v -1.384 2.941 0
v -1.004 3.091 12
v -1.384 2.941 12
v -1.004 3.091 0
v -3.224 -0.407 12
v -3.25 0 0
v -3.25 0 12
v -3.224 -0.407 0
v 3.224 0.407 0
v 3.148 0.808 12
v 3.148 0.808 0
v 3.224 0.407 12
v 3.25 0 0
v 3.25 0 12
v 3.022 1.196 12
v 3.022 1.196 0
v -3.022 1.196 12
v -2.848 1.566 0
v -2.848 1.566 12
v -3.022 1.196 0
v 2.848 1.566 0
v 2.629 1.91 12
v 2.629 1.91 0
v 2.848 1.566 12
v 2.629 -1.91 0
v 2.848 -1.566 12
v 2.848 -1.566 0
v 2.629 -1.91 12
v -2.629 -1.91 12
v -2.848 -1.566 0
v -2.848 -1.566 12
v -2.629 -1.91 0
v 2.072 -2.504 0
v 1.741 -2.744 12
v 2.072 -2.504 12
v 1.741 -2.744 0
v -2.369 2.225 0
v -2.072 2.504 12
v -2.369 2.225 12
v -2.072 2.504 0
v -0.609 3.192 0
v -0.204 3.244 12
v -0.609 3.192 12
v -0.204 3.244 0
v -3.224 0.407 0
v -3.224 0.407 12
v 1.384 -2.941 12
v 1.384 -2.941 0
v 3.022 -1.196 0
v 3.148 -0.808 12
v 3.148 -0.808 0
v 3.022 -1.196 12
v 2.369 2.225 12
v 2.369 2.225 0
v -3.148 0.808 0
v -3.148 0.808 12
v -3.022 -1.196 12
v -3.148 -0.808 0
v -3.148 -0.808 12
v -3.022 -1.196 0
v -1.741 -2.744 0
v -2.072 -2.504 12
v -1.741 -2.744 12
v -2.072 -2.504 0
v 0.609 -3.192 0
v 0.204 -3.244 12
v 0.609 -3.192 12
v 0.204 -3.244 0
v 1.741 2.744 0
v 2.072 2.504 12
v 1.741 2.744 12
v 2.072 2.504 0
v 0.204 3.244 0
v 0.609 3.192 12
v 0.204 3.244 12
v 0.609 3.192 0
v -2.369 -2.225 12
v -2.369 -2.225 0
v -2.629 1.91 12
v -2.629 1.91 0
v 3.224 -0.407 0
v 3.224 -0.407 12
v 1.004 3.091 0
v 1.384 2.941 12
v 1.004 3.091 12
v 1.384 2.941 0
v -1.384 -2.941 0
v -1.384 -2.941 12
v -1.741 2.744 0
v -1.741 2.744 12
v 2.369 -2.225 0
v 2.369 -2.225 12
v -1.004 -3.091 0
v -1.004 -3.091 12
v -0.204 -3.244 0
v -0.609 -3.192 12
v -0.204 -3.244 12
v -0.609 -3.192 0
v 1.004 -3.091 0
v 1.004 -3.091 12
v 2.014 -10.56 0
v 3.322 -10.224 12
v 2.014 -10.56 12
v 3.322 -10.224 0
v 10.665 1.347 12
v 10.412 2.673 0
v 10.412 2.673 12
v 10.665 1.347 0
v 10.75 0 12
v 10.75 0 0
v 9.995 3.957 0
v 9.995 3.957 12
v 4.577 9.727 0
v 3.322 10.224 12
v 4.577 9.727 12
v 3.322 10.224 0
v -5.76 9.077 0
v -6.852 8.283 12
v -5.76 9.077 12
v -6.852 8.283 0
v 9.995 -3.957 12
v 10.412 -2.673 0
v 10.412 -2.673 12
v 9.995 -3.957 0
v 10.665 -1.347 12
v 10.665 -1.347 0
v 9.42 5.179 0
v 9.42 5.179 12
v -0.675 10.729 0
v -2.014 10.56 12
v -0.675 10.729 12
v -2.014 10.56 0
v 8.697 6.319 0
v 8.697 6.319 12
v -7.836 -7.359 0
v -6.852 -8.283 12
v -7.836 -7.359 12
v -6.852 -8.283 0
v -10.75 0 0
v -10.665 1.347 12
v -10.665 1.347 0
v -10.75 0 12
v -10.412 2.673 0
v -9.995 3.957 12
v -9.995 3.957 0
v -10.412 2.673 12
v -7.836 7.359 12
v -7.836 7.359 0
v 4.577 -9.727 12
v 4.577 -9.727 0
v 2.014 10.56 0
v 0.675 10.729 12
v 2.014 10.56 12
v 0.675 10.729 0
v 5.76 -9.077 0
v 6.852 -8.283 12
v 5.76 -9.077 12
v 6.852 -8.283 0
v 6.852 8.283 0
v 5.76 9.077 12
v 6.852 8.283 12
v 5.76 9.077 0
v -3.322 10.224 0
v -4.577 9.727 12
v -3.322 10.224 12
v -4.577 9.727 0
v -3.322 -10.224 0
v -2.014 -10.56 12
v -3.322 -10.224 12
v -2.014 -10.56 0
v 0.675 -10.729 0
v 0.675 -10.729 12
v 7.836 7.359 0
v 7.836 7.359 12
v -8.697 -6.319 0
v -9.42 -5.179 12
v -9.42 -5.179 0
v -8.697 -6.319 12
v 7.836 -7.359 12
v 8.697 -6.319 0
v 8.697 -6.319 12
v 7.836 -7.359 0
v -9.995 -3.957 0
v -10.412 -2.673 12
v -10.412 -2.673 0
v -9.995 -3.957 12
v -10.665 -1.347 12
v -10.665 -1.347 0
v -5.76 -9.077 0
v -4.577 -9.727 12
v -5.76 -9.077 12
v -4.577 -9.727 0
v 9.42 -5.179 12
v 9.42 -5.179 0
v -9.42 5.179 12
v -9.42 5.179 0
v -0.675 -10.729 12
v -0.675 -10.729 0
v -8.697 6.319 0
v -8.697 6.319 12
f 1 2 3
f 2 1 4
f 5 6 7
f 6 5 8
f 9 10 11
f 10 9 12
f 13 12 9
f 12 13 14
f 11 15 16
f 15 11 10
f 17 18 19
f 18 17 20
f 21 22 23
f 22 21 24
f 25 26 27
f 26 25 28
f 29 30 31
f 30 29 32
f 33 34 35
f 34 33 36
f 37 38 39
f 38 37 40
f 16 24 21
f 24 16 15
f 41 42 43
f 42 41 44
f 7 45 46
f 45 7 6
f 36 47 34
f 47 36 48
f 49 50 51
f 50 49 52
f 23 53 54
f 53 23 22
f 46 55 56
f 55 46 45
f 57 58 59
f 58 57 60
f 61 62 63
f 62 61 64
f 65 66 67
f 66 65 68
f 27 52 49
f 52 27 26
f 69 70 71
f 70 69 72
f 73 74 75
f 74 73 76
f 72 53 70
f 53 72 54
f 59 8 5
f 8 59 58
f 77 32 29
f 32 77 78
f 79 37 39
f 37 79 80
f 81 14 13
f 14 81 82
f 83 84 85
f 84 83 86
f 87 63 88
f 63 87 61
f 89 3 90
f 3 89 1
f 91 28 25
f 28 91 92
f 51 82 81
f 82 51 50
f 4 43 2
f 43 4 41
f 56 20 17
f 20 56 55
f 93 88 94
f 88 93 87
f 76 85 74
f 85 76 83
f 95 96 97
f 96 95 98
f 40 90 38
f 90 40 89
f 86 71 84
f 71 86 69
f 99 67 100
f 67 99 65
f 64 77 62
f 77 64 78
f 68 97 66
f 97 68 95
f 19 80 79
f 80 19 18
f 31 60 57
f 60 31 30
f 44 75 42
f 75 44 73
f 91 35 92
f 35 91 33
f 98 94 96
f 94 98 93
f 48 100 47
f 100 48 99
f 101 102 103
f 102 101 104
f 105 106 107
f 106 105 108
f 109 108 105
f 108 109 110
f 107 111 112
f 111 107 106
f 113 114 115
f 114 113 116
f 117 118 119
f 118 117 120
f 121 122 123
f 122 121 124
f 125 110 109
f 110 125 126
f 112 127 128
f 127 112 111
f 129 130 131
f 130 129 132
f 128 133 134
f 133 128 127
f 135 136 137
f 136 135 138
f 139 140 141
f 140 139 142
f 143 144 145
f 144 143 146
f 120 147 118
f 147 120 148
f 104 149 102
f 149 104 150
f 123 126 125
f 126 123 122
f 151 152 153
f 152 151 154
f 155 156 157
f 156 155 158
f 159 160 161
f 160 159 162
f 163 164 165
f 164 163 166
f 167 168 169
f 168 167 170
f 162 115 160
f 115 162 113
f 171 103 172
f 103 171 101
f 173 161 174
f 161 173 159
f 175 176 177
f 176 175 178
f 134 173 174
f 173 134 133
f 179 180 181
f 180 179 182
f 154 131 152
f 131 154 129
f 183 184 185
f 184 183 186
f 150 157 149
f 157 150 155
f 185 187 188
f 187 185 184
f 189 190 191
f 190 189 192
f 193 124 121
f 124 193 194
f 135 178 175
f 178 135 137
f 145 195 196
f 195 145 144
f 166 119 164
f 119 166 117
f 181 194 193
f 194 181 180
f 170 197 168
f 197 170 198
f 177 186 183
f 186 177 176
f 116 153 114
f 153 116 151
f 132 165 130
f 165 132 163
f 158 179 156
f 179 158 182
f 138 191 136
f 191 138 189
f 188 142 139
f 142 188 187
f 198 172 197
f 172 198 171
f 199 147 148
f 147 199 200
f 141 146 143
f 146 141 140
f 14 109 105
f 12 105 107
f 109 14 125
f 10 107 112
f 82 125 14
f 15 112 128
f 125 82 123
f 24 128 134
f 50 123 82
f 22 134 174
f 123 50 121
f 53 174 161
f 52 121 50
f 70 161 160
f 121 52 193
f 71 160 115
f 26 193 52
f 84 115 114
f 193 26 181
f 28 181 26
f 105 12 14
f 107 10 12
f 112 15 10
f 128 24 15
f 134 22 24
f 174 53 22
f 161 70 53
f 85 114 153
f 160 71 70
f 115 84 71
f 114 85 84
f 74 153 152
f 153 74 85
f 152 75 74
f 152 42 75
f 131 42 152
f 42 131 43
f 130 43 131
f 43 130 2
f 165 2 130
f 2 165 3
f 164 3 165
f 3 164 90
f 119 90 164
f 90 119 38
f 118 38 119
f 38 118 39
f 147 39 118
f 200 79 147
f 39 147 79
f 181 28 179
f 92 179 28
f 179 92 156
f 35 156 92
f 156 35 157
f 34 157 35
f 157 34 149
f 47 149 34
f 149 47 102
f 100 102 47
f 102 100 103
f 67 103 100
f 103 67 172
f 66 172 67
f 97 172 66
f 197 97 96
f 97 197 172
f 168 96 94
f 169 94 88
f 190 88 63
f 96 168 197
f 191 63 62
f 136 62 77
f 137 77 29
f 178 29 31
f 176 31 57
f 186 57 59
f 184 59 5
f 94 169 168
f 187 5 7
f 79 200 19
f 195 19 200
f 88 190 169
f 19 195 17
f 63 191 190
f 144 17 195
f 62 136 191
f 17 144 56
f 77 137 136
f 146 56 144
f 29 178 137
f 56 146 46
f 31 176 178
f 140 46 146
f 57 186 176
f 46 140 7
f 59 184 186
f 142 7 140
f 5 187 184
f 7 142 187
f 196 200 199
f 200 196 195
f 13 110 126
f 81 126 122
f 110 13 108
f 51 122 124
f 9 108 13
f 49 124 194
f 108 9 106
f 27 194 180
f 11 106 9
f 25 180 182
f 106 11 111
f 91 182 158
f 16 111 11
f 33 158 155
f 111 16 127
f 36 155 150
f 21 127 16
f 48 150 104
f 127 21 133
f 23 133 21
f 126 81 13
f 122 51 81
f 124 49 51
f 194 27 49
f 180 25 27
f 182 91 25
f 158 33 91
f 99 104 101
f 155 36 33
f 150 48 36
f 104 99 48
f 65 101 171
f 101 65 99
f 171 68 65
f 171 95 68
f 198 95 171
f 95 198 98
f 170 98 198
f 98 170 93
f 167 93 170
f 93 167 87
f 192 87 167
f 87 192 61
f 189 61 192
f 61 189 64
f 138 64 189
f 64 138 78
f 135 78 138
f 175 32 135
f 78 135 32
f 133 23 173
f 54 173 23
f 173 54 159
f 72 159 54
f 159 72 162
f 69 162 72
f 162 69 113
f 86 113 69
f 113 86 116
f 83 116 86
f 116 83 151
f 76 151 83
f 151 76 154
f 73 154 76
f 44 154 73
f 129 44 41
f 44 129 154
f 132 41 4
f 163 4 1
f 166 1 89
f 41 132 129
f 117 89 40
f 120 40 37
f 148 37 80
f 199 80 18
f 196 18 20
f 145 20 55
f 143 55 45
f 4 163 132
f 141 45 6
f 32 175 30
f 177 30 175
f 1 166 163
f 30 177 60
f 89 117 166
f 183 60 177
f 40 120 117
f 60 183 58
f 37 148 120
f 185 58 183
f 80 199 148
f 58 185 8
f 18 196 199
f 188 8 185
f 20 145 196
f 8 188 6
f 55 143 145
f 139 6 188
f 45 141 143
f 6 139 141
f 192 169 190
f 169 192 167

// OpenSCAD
$fn = 50;


difference() {
	union() {
		*color(alpha = 1.0000000000, c = "gray") {
			translate(v = [0, 7, 0]) {
				linear_extrude(height = 1) {
					text(font = "Arial:style=Bold", halign = "center", size = 4.5000000000, text = "COMMENT circle main", valign = "center");
				}
			}
		}
		*color(alpha = 1.0000000000, c = "gray") {
			translate(v = [0, 14, 0]) {
				linear_extrude(height = 1.5000000000) {
					text(font = "Arial:style=Bold", halign = "center", size = 4.5000000000, text = "COMMENT description oobb_circle_shape_p_type_12_depth_1.5_diameter_12_thickness_1.5_width_1.5_height", valign = "center");
				}
			}
		}
		cylinder(h = 12, r = 10.7500000000);
	}
	union() {
		*color(alpha = 1.0000000000, c = "gray") {
			translate(v = [0, 7, 0]) {
				linear_extrude(height = 1) {
					text(font = "Arial:style=Bold", halign = "center", size = 4.5000000000, text = "COMMENT holes main", valign = "center");
				}
			}
		}
		*color(alpha = 1.0000000000, c = "gray") {
			translate(v = [0, 14, 0]) {
				linear_extrude(height = 1.5000000000) {
					text(font = "Arial:style=Bold", halign = "center", size = 4.5000000000, text = "COMMENT description oobb_holes_shape_n_type_1.5_diameter_12_thickness_1.5_width_1.5_height_true_both_holes_true_circle", valign = "center");
				}
			}
		}
		translate(v = [0.0000000000, 0.0000000000, -50.0000000000]) {
			cylinder(h = 100, r = 3.2500000000);
		}
		translate(v = [0.0000000000, 0.0000000000, -50.0000000000]) {
			cylinder(h = 100, r = 3.2500000000);
		}
		translate(v = [0.0000000000, 0.0000000000, -50.0000000000]) {
			cylinder(h = 100, r = 3.2500000000);
		}
	}
}
